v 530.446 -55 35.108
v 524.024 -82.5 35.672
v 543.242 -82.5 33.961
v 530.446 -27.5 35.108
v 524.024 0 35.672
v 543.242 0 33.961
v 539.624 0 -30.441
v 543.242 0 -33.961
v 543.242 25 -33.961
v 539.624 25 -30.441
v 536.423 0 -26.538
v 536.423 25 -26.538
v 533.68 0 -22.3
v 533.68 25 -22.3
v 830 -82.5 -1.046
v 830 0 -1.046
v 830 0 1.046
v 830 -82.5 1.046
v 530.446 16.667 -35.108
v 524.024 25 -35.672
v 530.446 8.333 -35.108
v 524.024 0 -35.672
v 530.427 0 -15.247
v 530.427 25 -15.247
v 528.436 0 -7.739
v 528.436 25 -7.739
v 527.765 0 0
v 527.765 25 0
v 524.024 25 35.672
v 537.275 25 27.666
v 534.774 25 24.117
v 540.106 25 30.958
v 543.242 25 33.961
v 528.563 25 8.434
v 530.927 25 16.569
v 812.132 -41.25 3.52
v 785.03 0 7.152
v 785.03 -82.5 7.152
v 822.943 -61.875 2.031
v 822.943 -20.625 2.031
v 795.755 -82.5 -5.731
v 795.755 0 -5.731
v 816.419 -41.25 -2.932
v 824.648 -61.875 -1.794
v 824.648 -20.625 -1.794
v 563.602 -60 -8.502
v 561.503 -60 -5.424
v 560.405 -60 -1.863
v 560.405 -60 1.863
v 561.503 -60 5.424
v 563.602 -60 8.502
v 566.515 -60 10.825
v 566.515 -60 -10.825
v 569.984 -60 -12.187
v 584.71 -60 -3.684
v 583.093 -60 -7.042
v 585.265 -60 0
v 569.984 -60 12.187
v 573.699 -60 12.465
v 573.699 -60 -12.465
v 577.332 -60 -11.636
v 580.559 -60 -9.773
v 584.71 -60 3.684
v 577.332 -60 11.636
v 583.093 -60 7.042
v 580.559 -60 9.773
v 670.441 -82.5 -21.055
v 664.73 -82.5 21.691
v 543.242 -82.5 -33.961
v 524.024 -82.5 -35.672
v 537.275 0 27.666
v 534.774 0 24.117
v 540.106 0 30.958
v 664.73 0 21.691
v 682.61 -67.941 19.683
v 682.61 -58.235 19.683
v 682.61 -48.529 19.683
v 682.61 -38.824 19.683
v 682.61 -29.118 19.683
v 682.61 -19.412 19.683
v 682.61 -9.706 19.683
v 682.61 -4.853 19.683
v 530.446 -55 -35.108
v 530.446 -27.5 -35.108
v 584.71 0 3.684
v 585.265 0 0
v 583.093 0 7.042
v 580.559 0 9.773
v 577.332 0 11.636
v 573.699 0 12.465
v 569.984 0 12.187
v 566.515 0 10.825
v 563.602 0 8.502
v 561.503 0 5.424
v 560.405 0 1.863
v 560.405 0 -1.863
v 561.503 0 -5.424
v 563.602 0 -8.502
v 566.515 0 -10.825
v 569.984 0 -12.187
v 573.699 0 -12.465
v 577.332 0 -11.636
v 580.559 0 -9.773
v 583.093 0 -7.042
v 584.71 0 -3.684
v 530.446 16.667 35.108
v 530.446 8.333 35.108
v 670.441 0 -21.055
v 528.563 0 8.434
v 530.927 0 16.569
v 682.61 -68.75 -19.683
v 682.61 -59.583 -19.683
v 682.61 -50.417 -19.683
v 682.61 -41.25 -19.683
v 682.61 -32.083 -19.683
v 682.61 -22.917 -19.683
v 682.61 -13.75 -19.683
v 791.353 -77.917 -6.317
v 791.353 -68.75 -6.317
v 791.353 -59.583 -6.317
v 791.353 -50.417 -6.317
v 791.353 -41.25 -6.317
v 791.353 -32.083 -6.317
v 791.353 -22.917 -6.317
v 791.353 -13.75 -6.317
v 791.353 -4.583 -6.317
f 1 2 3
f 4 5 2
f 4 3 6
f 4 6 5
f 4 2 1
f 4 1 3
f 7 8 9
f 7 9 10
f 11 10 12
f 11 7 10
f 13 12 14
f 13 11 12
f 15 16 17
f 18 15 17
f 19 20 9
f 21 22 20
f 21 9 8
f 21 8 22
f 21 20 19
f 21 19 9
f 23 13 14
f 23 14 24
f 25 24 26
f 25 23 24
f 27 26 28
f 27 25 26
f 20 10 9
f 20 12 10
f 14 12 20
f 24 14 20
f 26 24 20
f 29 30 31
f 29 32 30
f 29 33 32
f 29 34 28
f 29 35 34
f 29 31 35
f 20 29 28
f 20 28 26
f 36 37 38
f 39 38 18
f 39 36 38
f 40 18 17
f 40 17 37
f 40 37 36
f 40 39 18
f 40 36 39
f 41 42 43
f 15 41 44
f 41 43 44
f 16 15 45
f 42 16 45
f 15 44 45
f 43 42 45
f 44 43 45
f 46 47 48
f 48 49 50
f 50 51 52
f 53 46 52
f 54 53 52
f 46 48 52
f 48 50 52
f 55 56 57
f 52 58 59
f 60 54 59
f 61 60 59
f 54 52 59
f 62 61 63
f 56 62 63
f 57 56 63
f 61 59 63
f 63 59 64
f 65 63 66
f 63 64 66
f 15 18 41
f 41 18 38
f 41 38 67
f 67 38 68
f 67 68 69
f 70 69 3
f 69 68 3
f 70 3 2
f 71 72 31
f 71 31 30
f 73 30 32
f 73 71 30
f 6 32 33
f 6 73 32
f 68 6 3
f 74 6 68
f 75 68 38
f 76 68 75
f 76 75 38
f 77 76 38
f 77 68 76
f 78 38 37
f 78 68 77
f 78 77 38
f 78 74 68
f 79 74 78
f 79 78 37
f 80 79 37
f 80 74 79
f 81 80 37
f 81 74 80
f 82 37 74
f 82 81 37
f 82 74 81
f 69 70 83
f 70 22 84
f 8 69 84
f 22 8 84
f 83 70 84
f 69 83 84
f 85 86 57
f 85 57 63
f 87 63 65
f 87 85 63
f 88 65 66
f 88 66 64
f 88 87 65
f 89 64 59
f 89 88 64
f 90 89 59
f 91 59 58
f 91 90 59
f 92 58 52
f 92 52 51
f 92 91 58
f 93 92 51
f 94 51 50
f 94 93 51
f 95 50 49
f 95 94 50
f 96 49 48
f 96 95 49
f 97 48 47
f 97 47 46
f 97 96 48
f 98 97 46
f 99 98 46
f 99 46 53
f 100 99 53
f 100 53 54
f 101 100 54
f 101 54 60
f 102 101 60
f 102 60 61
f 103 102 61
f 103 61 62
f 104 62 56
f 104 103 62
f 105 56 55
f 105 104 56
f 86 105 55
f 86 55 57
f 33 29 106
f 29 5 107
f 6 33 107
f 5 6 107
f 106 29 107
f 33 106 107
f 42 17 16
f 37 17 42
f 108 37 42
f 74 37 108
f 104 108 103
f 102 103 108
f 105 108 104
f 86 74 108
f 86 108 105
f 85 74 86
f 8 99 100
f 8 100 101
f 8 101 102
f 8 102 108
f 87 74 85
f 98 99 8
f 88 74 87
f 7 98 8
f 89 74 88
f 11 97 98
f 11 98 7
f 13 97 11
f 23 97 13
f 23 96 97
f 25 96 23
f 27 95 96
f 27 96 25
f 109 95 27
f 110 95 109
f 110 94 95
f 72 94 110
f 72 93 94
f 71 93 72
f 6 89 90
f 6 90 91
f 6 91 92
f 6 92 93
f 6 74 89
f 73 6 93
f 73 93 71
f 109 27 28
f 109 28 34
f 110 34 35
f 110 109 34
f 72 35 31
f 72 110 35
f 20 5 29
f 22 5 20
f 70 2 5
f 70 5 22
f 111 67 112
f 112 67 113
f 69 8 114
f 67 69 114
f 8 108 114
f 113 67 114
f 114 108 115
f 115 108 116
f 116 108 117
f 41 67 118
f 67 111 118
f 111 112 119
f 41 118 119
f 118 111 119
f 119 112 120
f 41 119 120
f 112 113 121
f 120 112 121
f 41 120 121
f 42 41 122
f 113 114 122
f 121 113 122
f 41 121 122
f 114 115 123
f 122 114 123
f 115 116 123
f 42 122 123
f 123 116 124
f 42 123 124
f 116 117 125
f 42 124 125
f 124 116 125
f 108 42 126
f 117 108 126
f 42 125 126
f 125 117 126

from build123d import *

# Parameters (mm, degrees)
F1_DEPTH = 82.5
F2_DEPTH = 25
F3_R     = 12.5
F4_DEPTH = 60


with BuildPart() as f1:
    # F0 (on Front) → F1 (new body)
    with BuildSketch(Plane.XZ):
        with BuildLine():
            add(Edge.make_bspline(
                [(524.024, 35.6715651167), (530.4529675183, 35.1109062879), (536.8603422789, 34.540475321), (543.2421, 33.9614)],
                knots=[0.6159550767, 0.6159550767, 0.6159550767, 0.6159550767, 0.635369827, 0.635369827, 0.635369827, 0.635369827], degree=3))
            Line((524.024, 35.6715651167), (524.024, 25.1107127602))
            add(Edge.make_bspline(
                [(524.024, 25.1107127602), (526.6770638269, 24.868020166), (530.2603237936, 24.5375720807), (533.8432643328, 24.2037227591), (534.7735361573, 24.1168150682)],
                knots=[513.3651484855, 513.3651484855, 513.3651484855, 513.3651484855, 521.3575419642, 524.1605032173, 524.1605032173, 524.1605032173, 524.1605032173], degree=3))
            ThreePointArc((534.7735361573, 24.1168150682), (538.650838246, 29.3461907199), (543.2421, 33.9614))
        make_face()
        with BuildLine():
            Line((524.024, -23.2286070743), (524.024, -35.6715651167))
            add(Edge.make_bspline(
                [(524.024, -35.6715651167), (530.4529675183, -35.1109062879), (536.8603422789, -34.540475321), (543.2421, -33.9614)],
                knots=[0.6159550767, 0.6159550767, 0.6159550767, 0.6159550767, 0.635369827, 0.635369827, 0.635369827, 0.635369827], degree=3))
            ThreePointArc((543.2421, -33.9614), (537.9689313182, -28.5343309954), (533.6796750092, -22.3004184004))
            add(Edge.make_bspline(
                [(524.024, -23.2286070743), (526.7063477836, -22.9731340758), (529.9249490386, -22.6641634275), (533.1432820941, -22.3524476401), (533.6796750092, -22.3004184004)],
                knots=[513.2741132252, 513.2741132252, 513.2741132252, 513.2741132252, 521.3575419641, 522.9742691651, 522.9742691651, 522.9742691651, 522.9742691651], degree=3))
        make_face()
        with BuildLine():
            add(Edge.make_bspline(
                [(524.024, 25.1107127602), (526.6770638269, 24.868020166), (530.2603237936, 24.5375720807), (533.8432643328, 24.2037227591), (534.7735361573, 24.1168150682)],
                knots=[513.3651484855, 513.3651484855, 513.3651484855, 513.3651484855, 521.3575419642, 524.1605032173, 524.1605032173, 524.1605032173, 524.1605032173], degree=3))
            Line((524.024, 25.1107127602), (524.024, 0))
            Line((524.024, 0), (527.7653672657, 0))
            ThreePointArc((527.7653672657, 0), (529.5529130431, 12.5572210326), (534.7735361573, 24.1168150682))
        make_face()
        with BuildLine():
            Line((524.024, 0), (524.024, -23.2286070743))
            add(Edge.make_bspline(
                [(524.024, -23.2286070743), (526.7063477836, -22.9731340758), (529.9249490386, -22.6641634275), (533.1432820941, -22.3524476401), (533.6796750092, -22.3004184004)],
                knots=[513.2741132252, 513.2741132252, 513.2741132252, 513.2741132252, 521.3575419641, 522.9742691651, 522.9742691651, 522.9742691651, 522.9742691651], degree=3))
            ThreePointArc((533.6796750092, -22.3004184004), (529.2690677016, -11.535680484), (527.7653672657, 0))
            Line((527.7653672657, 0), (524.024, 0))
        make_face()
        with BuildLine():
            add(Edge.make_bspline(
                [(543.2421, 33.9614), (549.5750436875, 33.3867540232), (562.1338476881, 32.225672374), (580.7053749717, 30.4486309004), (598.8899905971, 28.6520916952), (616.645063933, 26.8456524154), (633.9293517992, 25.0378311486), (650.7021084927, 23.2377895738), (666.924523511, 21.4542053534), (682.5583919944, 19.6948931431), (697.5675188661, 17.9689901739), (711.9166403588, 16.2843520174), (725.5723159977, 14.6495448382), (738.5025922877, 13.0722198932), (750.6773575973, 11.5611505206), (762.0679980169, 10.123355488), (772.6482697775, 8.767506964), (780.1684058461, 7.7893010713), (784.1801262556, 7.2631536294), (785.0296548206, 7.1515377434)],
                knots=[0.635369827, 0.635369827, 0.635369827, 0.635369827, 0.654636074, 0.6737293504, 0.6926255053, 0.7112999065, 0.7297277282, 0.747883428, 0.7657412837, 0.7832747177, 0.8004566202, 0.8172588362, 0.8336522425, 0.8496064603, 0.8650895564, 0.8800677295, 0.8945049966, 0.9083621399, 0.9121165786, 0.9121165786, 0.9121165786, 0.9121165786], degree=3))
            ThreePointArc((543.2421, 33.9614), (538.650838246, 29.3461907199), (534.7735361573, 24.1168150682))
            add(Edge.make_bspline(
                [(534.7735361573, 24.1168150682), (547.4888491387, 22.9289273345), (570.2810474133, 20.7234876988), (602.9514797769, 17.4132456465), (629.5721727855, 14.5753690345), (646.1150179567, 12.7470797563), (652.7777391491, 12)],
                knots=[524.1605032173, 524.1605032173, 524.1605032173, 524.1605032173, 562.4724553443, 592.8561025481, 622.6732889332, 642.7866986571, 642.7866986571, 642.7866986571, 642.7866986571], degree=3))
            Line((652.7777391491, 12), (665.973, 12))
            ThreePointArc((665.973, 12), (669.6925428199, 11.4089877382), (673.0457030707, 9.6941668684))
            add(Edge.make_bspline(
                [(673.0457030707, 9.6941668684), (678.6430527256, 9.0482316549), (693.2761814168, 7.3399638663), (715.1021603081, 4.7178028299), (732.4511827497, 2.5525104658), (740.7700852943, 1.4970109313), (741.8962423005, 1.3538186415)],
                knots=[663.1854009899, 663.1854009899, 663.1854009899, 663.1854009899, 680.0888797975, 707.3828314911, 729.1339381861, 732.5396092821, 732.5396092821, 732.5396092821, 732.5396092821], degree=3))
            add(Edge.make_bspline(
                [(741.8962423005, 1.3538186415), (746.2843670673, 1.9285048035), (754.6747553371, 3.0362373869), (766.9194584147, 4.6744667559), (776.9091256945, 6.0324501077), (782.8966080674, 6.8566568424), (785.0296548206, 7.1515377434)],
                knots=[732.5396092819, 732.5396092819, 732.5396092819, 732.5396092819, 745.8163943039, 757.9291810967, 769.6010098164, 776.0610078587, 776.0610078587, 776.0610078587, 776.0610078587], degree=3))
        make_face()
        with BuildLine():
            ThreePointArc((533.6796750092, -22.3004184004), (537.9689313182, -28.5343309954), (543.2421, -33.9614))
            add(Edge.make_bspline(
                [(543.2421, -33.9614), (549.5750436875, -33.3867540232), (562.1338476881, -32.225672374), (580.7053749717, -30.4486309004), (598.8899905971, -28.6520916952), (616.645063933, -26.8456524154), (633.9293517992, -25.0378311486), (650.7021084927, -23.2377895738), (666.924523511, -21.4542053534), (682.5583919944, -19.6948931431), (697.5675188661, -17.9689901739), (711.9166403588, -16.2843520174), (725.5723159977, -14.6495448382), (738.5025922877, -13.0722198932), (750.6773575973, -11.5611505206), (762.0679980169, -10.123355488), (772.6482697775, -8.767506964), (782.3928967751, -7.4999432572), (789.9922436278, -6.4986676858), (794.3093421293, -5.9243671687), (795.7553403022, -5.731408495)],
                knots=[0.635369827, 0.635369827, 0.635369827, 0.635369827, 0.654636074, 0.6737293504, 0.6926255053, 0.7112999065, 0.7297277282, 0.747883428, 0.7657412837, 0.7832747177, 0.8004566202, 0.8172588362, 0.8336522425, 0.8496064603, 0.8650895564, 0.8800677295, 0.8945049966, 0.9083621399, 0.921596776, 0.9284158886, 0.9284158886, 0.9284158886, 0.9284158886], degree=3))
            add(Edge.make_bspline(
                [(752.4752127939, 0), (753.3385987131, -0.1111737387), (758.2064040588, -0.7388852768), (766.9317355754, -1.8729638235), (778.4845581837, -3.3993366737), (788.0433504555, -4.682906586), (793.7449819172, -5.4572465403), (795.7553403022, -5.731408495)],
                knots=[743.2048524915, 743.2048524915, 743.2048524915, 743.2048524915, 745.816394304, 757.9291810969, 769.6010098166, 780.7760242539, 786.8629233002, 786.8629233002, 786.8629233002, 786.8629233002], degree=3))
            Line((752.4752127939, 0), (731.4902537549, 0))
            add(Edge.make_bspline(
                [(675.7749550869, -6.922548409), (680.4704196169, -6.3608211123), (694.1976504575, -4.7032327955), (712.7702276209, -2.4012449385), (726.6428498764, -0.6263462539), (731.4902537549, 0)],
                knots=[665.902054437, 665.902054437, 665.902054437, 665.902054437, 680.0888797974, 707.382831491, 722.0459285975, 722.0459285975, 722.0459285975, 722.0459285975], degree=3))
            ThreePointArc((675.7749550869, -6.922548409), (671.4924845363, -10.6552940107), (665.973, -12))
            Line((665.973, -12), (632.0462382215, -12))
            add(Edge.make_bspline(
                [(579.5327593007, -17.6845550908), (587.4225464727, -16.8640224682), (604.9318542045, -15.0134548613), (622.4325289508, -13.08262656), (632.0462382215, -12)],
                knots=[569.0591158558, 569.0591158558, 569.0591158558, 569.0591158558, 592.856102548, 621.8794937898, 621.8794937898, 621.8794937898, 621.8794937898], degree=3))
            add(Edge.make_bspline(
                [(569.024, -20), (574.601223494, -20), (579.5327593007, -17.6845550908)],
                knots=[4.7123889804, 4.7123889804, 4.7123889804, 5.1983473252, 5.1983473252, 5.1983473252], degree=2, weights=[1, 0.9706255083, 1]))
            add(Edge.make_bspline(
                [(563.3375761456, -19.3507371729), (566.1338768344, -20), (569.024, -20)],
                knots=[4.4568882152, 4.4568882152, 4.4568882152, 4.7123889804, 4.7123889804, 4.7123889804], degree=2, weights=[1, 0.9918510117, 1]))
            add(Edge.make_bspline(
                [(533.6796750092, -22.3004184004), (543.5680241797, -21.3412646258), (553.4538623678, -20.3564530629), (563.3375761456, -19.3507371729)],
                knots=[522.9742691651, 522.9742691651, 522.9742691651, 522.9742691651, 552.7784716909, 552.7784716909, 552.7784716909, 552.7784716909], degree=3))
        make_face()
        with BuildLine():
            add(Edge.make_bspline(
                [(534.7735361573, 24.1168150682), (547.4888491387, 22.9289273345), (570.2810474133, 20.7234876988), (602.9514797769, 17.4132456465), (629.5721727855, 14.5753690345), (646.1150179567, 12.7470797563), (652.7777391491, 12)],
                knots=[524.1605032173, 524.1605032173, 524.1605032173, 524.1605032173, 562.4724553443, 592.8561025481, 622.6732889332, 642.7866986571, 642.7866986571, 642.7866986571, 642.7866986571], degree=3))
            ThreePointArc((534.7735361573, 24.1168150682), (529.5529130431, 12.5572210326), (527.7653672657, 0))
            Line((527.7653672657, 0), (546.524, 0))
            add(Edge.make_bspline(
                [(591.524, 0), (591.524, 20), (569.024, 20), (546.524, 20), (546.524, 0)],
                knots=[0, 0, 0, 1.5707963268, 1.5707963268, 3.1415926536, 3.1415926536, 3.1415926536], degree=2, weights=[1, 0.7071067812, 1, 0.7071067812, 1]))
            Line((591.524, 0), (623.973, 0))
            Line((623.973, 0), (623.973, 10))
            ThreePointArc((623.973, 10), (624.5587864376, 11.4142135624), (625.973, 12))
            Line((625.973, 12), (652.7777391491, 12))
        make_face()
        with BuildLine():
            ThreePointArc((527.7653672657, 0), (529.2690677016, -11.535680484), (533.6796750092, -22.3004184004))
            add(Edge.make_bspline(
                [(533.6796750092, -22.3004184004), (543.5680241797, -21.3412646258), (553.4538623678, -20.3564530629), (563.3375761456, -19.3507371729)],
                knots=[522.9742691651, 522.9742691651, 522.9742691651, 522.9742691651, 552.7784716909, 552.7784716909, 552.7784716909, 552.7784716909], degree=3))
            add(Edge.make_bspline(
                [(546.524, 0), (546.524, -15.4468544374), (563.3375761456, -19.3507371729)],
                knots=[3.1415926536, 3.1415926536, 3.1415926536, 4.4568882152, 4.4568882152, 4.4568882152], degree=2, weights=[1, 0.7914322299, 1]))
            Line((546.524, 0), (527.7653672657, 0))
        make_face()
        with BuildLine():
            add(Edge.make_bspline(
                [(785.0296548206, 7.1515377434), (787.174768668, 6.8697005072), (792.0785180819, 6.2224623401), (799.2875794028, 5.2606805783), (806.398007937, 4.3017234095), (812.5937368846, 3.4579115596), (817.8623783077, 2.7342517017), (822.1845332462, 2.1365671069), (825.5717903187, 1.6654782983), (827.9484571682, 1.33323589), (829.4727060537, 1.1198422864), (829.8586880275, 1.0656429389), (830, 1.0458)],
                knots=[0.9121165786, 0.9121165786, 0.9121165786, 0.9121165786, 0.921596776, 0.9341612481, 0.9460018444, 0.9570561288, 0.9672492741, 0.9764880356, 0.9846490394, 0.9915545746, 0.9969080429, 1, 1, 1, 1], degree=3))
            add(Edge.make_bspline(
                [(741.8962423005, 1.3538186415), (746.2843670673, 1.9285048035), (754.6747553371, 3.0362373869), (766.9194584147, 4.6744667559), (776.9091256945, 6.0324501077), (782.8966080674, 6.8566568424), (785.0296548206, 7.1515377434)],
                knots=[732.5396092819, 732.5396092819, 732.5396092819, 732.5396092819, 745.8163943039, 757.9291810967, 769.6010098164, 776.0610078587, 776.0610078587, 776.0610078587, 776.0610078587], degree=3))
            add(Edge.make_bspline(
                [(741.8962423005, 1.3538186415), (745.4229300003, 0.9053958333), (748.9492417496, 0.4540210524), (752.4752127939, 0)],
                knots=[732.5396092821, 732.5396092821, 732.5396092821, 732.5396092821, 743.2048524915, 743.2048524915, 743.2048524915, 743.2048524915], degree=3))
            Line((752.4752127939, 0), (830, 0))
            Line((830, 0), (830, 1.0458))
        make_face()
        with BuildLine():
            add(Edge.make_bspline(
                [(752.4752127939, 0), (753.3385987131, -0.1111737387), (758.2064040588, -0.7388852768), (766.9317355754, -1.8729638235), (778.4845581837, -3.3993366737), (788.0433504555, -4.682906586), (793.7449819172, -5.4572465403), (795.7553403022, -5.731408495)],
                knots=[743.2048524915, 743.2048524915, 743.2048524915, 743.2048524915, 745.816394304, 757.9291810969, 769.6010098166, 780.7760242539, 786.8629233002, 786.8629233002, 786.8629233002, 786.8629233002], degree=3))
            add(Edge.make_bspline(
                [(795.7553403022, -5.731408495), (796.9736482838, -5.568833537), (800.6549707765, -5.0762655667), (806.398007937, -4.3017234095), (812.5937368846, -3.4579115596), (817.8623783077, -2.7342517017), (822.1845332462, -2.1365671069), (825.5717903187, -1.6654782983), (827.9484571682, -1.33323589), (829.4727060537, -1.1198422864), (829.8586880275, -1.0656429389), (830, -1.0458)],
                knots=[0.9284158886, 0.9284158886, 0.9284158886, 0.9284158886, 0.9341612481, 0.9460018444, 0.9570561288, 0.9672492741, 0.9764880356, 0.9846490394, 0.9915545746, 0.9969080429, 1, 1, 1, 1], degree=3))
            Line((830, -1.0458), (830, 0))
            Line((830, 0), (752.4752127939, 0))
        make_face()
        with BuildLine():
            Line((665.973, 12), (652.7777391491, 12))
            add(Edge.make_bspline(
                [(652.7777391491, 12), (655.762922623, 11.6652763822), (660.161514663, 11.1688961032), (664.5595773708, 10.6678568096), (665.973, 10.5063520034)],
                knots=[642.7866986571, 642.7866986571, 642.7866986571, 642.7866986571, 651.7983646979, 656.0662217526, 656.0662217526, 656.0662217526, 656.0662217526], degree=3))
            Line((665.973, 10.5063520034), (665.973, 12))
        make_face()
        with BuildLine():
            add(Edge.make_bspline(
                [(652.7777391491, 12), (655.762922623, 11.6652763822), (660.161514663, 11.1688961032), (664.5595773708, 10.6678568096), (665.973, 10.5063520034)],
                knots=[642.7866986571, 642.7866986571, 642.7866986571, 642.7866986571, 651.7983646979, 656.0662217526, 656.0662217526, 656.0662217526, 656.0662217526], degree=3))
            Line((652.7777391491, 12), (625.973, 12))
            ThreePointArc((625.973, 12), (624.5587864376, 11.4142135624), (623.973, 10))
            Line((623.973, 10), (623.973, 0))
            Line((623.973, 0), (665.973, 0))
            Line((665.973, 0), (665.973, 10.5063520034))
        make_face()
        with BuildLine():
            add(Edge.make_bspline(
                [(546.524, 0), (546.524, -15.4468544374), (563.3375761456, -19.3507371729)],
                knots=[3.1415926536, 3.1415926536, 3.1415926536, 4.4568882152, 4.4568882152, 4.4568882152], degree=2, weights=[1, 0.7914322299, 1]))
            add(Edge.make_bspline(
                [(563.3375761456, -19.3507371729), (566.5523093603, -19.0236224518), (571.9509432397, -18.4705327095), (577.3489807289, -17.911666611), (579.5327593007, -17.6845550908)],
                knots=[552.7784716909, 552.7784716909, 552.7784716909, 552.7784716909, 562.4724553442, 569.0591158558, 569.0591158558, 569.0591158558, 569.0591158558], degree=3))
            add(Edge.make_bspline(
                [(579.5327593007, -17.6845550908), (591.524, -12.0544515447), (591.524, 0)],
                knots=[5.1983473252, 5.1983473252, 5.1983473252, 6.2831853072, 6.2831853072, 6.2831853072], degree=2, weights=[1, 0.8564624828, 1]))
            Line((591.524, 0), (546.524, 0))
        make_face()
        with BuildLine():
            add(Edge.make_bspline(
                [(563.3375761456, -19.3507371729), (566.5523093603, -19.0236224518), (571.9509432397, -18.4705327095), (577.3489807289, -17.911666611), (579.5327593007, -17.6845550908)],
                knots=[552.7784716909, 552.7784716909, 552.7784716909, 552.7784716909, 562.4724553442, 569.0591158558, 569.0591158558, 569.0591158558, 569.0591158558], degree=3))
            add(Edge.make_bspline(
                [(563.3375761456, -19.3507371729), (566.1338768344, -20), (569.024, -20)],
                knots=[4.4568882152, 4.4568882152, 4.4568882152, 4.7123889804, 4.7123889804, 4.7123889804], degree=2, weights=[1, 0.9918510117, 1]))
            add(Edge.make_bspline(
                [(569.024, -20), (574.601223494, -20), (579.5327593007, -17.6845550908)],
                knots=[4.7123889804, 4.7123889804, 4.7123889804, 5.1983473252, 5.1983473252, 5.1983473252], degree=2, weights=[1, 0.9706255083, 1]))
        make_face()
        with BuildLine():
            add(Edge.make_bspline(
                [(731.4902537549, 0), (733.8334453003, 0.3027701597), (737.3022307159, 0.7531116765), (740.7706302145, 1.2064040341), (741.8962423005, 1.3538186415)],
                knots=[722.0459285975, 722.0459285975, 722.0459285975, 722.0459285975, 729.1339381859, 732.5396092819, 732.5396092819, 732.5396092819, 732.5396092819], degree=3))
            add(Edge.make_bspline(
                [(673.0457030707, 9.6941668684), (678.6430527256, 9.0482316549), (693.2761814168, 7.3399638663), (715.1021603081, 4.7178028299), (732.4511827497, 2.5525104658), (740.7700852943, 1.4970109313), (741.8962423005, 1.3538186415)],
                knots=[663.1854009899, 663.1854009899, 663.1854009899, 663.1854009899, 680.0888797975, 707.3828314911, 729.1339381861, 732.5396092821, 732.5396092821, 732.5396092821, 732.5396092821], degree=3))
            ThreePointArc((673.0457030707, 9.6941668684), (676.6704865471, 5.4372586453), (677.973, 0))
            Line((677.973, 0), (731.4902537549, 0))
        make_face()
        with BuildLine():
            add(Edge.make_bspline(
                [(741.8962423005, 1.3538186415), (745.4229300003, 0.9053958333), (748.9492417496, 0.4540210524), (752.4752127939, 0)],
                knots=[732.5396092821, 732.5396092821, 732.5396092821, 732.5396092821, 743.2048524915, 743.2048524915, 743.2048524915, 743.2048524915], degree=3))
            add(Edge.make_bspline(
                [(731.4902537549, 0), (733.8334453003, 0.3027701597), (737.3022307159, 0.7531116765), (740.7706302145, 1.2064040341), (741.8962423005, 1.3538186415)],
                knots=[722.0459285975, 722.0459285975, 722.0459285975, 722.0459285975, 729.1339381859, 732.5396092819, 732.5396092819, 732.5396092819, 732.5396092819], degree=3))
            Line((731.4902537549, 0), (752.4752127939, 0))
        make_face()
        with BuildLine():
            add(Edge.make_bspline(
                [(591.524, 0), (591.524, 20), (569.024, 20), (546.524, 20), (546.524, 0)],
                knots=[0, 0, 0, 1.5707963268, 1.5707963268, 3.1415926536, 3.1415926536, 3.1415926536], degree=2, weights=[1, 0.7071067812, 1, 0.7071067812, 1]))
            Line((546.524, 0), (591.524, 0))
        make_face()
        with BuildLine():
            Line((665.973, 12), (665.973, 10.5063520034))
            add(Edge.make_bspline(
                [(665.973, 10.5063520034), (668.3307193205, 10.2369470894), (670.6882868311, 9.9662131504), (673.0457030707, 9.6941668684)],
                knots=[656.0662217526, 656.0662217526, 656.0662217526, 656.0662217526, 663.1854009899, 663.1854009899, 663.1854009899, 663.1854009899], degree=3))
            ThreePointArc((673.0457030707, 9.6941668684), (669.6925428199, 11.4089877382), (665.973, 12))
        make_face()
        with BuildLine():
            add(Edge.make_bspline(
                [(665.973, 10.5063520034), (668.3307193205, 10.2369470894), (670.6882868311, 9.9662131504), (673.0457030707, 9.6941668684)],
                knots=[656.0662217526, 656.0662217526, 656.0662217526, 656.0662217526, 663.1854009899, 663.1854009899, 663.1854009899, 663.1854009899], degree=3))
            Line((665.973, 10.5063520034), (665.973, 0))
            Line((665.973, 0), (677.973, 0))
            ThreePointArc((677.973, 0), (676.6704865471, 5.4372586453), (673.0457030707, 9.6941668684))
        make_face()
        with BuildLine():
            add(Edge.make_bspline(
                [(579.5327593007, -17.6845550908), (591.524, -12.0544515447), (591.524, 0)],
                knots=[5.1983473252, 5.1983473252, 5.1983473252, 6.2831853072, 6.2831853072, 6.2831853072], degree=2, weights=[1, 0.8564624828, 1]))
            add(Edge.make_bspline(
                [(579.5327593007, -17.6845550908), (587.4225464727, -16.8640224682), (604.9318542045, -15.0134548613), (622.4325289508, -13.08262656), (632.0462382215, -12)],
                knots=[569.0591158558, 569.0591158558, 569.0591158558, 569.0591158558, 592.856102548, 621.8794937898, 621.8794937898, 621.8794937898, 621.8794937898], degree=3))
            Line((632.0462382215, -12), (625.973, -12))
            ThreePointArc((625.973, -12), (624.5587864376, -11.4142135624), (623.973, -10))
            Line((623.973, -10), (623.973, 0))
            Line((623.973, 0), (591.524, 0))
        make_face()
        with BuildLine():
            add(Edge.make_bspline(
                [(675.7749550869, -6.922548409), (680.4704196169, -6.3608211123), (694.1976504575, -4.7032327955), (712.7702276209, -2.4012449385), (726.6428498764, -0.6263462539), (731.4902537549, 0)],
                knots=[665.902054437, 665.902054437, 665.902054437, 665.902054437, 680.0888797974, 707.382831491, 722.0459285975, 722.0459285975, 722.0459285975, 722.0459285975], degree=3))
            Line((731.4902537549, 0), (677.973, 0))
            ThreePointArc((677.973, 0), (677.4102955947, -3.6315657062), (675.7749550869, -6.922548409))
        make_face()
        with BuildLine():
            Line((665.973, -8.0874938306), (665.973, 0))
            Line((665.973, 0), (623.973, 0))
            Line((623.973, 0), (623.973, -10))
            ThreePointArc((623.973, -10), (624.5587864376, -11.4142135624), (625.973, -12))
            Line((625.973, -12), (632.0462382215, -12))
            add(Edge.make_bspline(
                [(632.0462382215, -12), (632.3091749564, -11.9703899624), (642.2194339984, -10.8537488755), (653.528780869, -9.5529086768), (664.5718113348, -8.2529185042), (665.973, -8.0874938306)],
                knots=[621.8794937898, 621.8794937898, 621.8794937898, 621.8794937898, 622.6732889331, 651.7983646977, 656.0311218622, 656.0311218622, 656.0311218622, 656.0311218622], degree=3))
        make_face()
        with BuildLine():
            Line((677.973, 0), (665.973, 0))
            Line((665.973, 0), (665.973, -8.0874938306))
            add(Edge.make_bspline(
                [(665.973, -8.0874938306), (669.2406192612, -7.7017179081), (672.5079370891, -7.3133879471), (675.7749550869, -6.922548409)],
                knots=[656.0311218622, 656.0311218622, 656.0311218622, 656.0311218622, 665.902054437, 665.902054437, 665.902054437, 665.902054437], degree=3))
            ThreePointArc((675.7749550869, -6.922548409), (677.4102955947, -3.6315657062), (677.973, 0))
        make_face()
        with BuildLine():
            add(Edge.make_bspline(
                [(632.0462382215, -12), (632.3091749564, -11.9703899624), (642.2194339984, -10.8537488755), (653.528780869, -9.5529086768), (664.5718113348, -8.2529185042), (665.973, -8.0874938306)],
                knots=[621.8794937898, 621.8794937898, 621.8794937898, 621.8794937898, 622.6732889331, 651.7983646977, 656.0311218622, 656.0311218622, 656.0311218622, 656.0311218622], degree=3))
            Line((632.0462382215, -12), (665.973, -12))
            Line((665.973, -12), (665.973, -8.0874938306))
        make_face()
        with BuildLine():
            ThreePointArc((665.973, -12), (671.4924845363, -10.6552940107), (675.7749550869, -6.922548409))
            add(Edge.make_bspline(
                [(665.973, -8.0874938306), (669.2406192612, -7.7017179081), (672.5079370891, -7.3133879471), (675.7749550869, -6.922548409)],
                knots=[656.0311218622, 656.0311218622, 656.0311218622, 656.0311218622, 665.902054437, 665.902054437, 665.902054437, 665.902054437], degree=3))
            Line((665.973, -8.0874938306), (665.973, -12))
        make_face()
    extrude(amount=F1_DEPTH)

    # F0 (on Front) → F2 (join)
    with BuildSketch(Plane.XZ):
        with BuildLine():
            add(Edge.make_bspline(
                [(524.024, 35.6715651167), (530.4529675183, 35.1109062879), (536.8603422789, 34.540475321), (543.2421, 33.9614)],
                knots=[0.6159550767, 0.6159550767, 0.6159550767, 0.6159550767, 0.635369827, 0.635369827, 0.635369827, 0.635369827], degree=3))
            Line((524.024, 35.6715651167), (524.024, 25.1107127602))
            add(Edge.make_bspline(
                [(524.024, 25.1107127602), (526.6770638269, 24.868020166), (530.2603237936, 24.5375720807), (533.8432643328, 24.2037227591), (534.7735361573, 24.1168150682)],
                knots=[513.3651484855, 513.3651484855, 513.3651484855, 513.3651484855, 521.3575419642, 524.1605032173, 524.1605032173, 524.1605032173, 524.1605032173], degree=3))
            ThreePointArc((534.7735361573, 24.1168150682), (538.650838246, 29.3461907199), (543.2421, 33.9614))
        make_face()
        with BuildLine():
            Line((524.024, -23.2286070743), (524.024, -35.6715651167))
            add(Edge.make_bspline(
                [(524.024, -35.6715651167), (530.4529675183, -35.1109062879), (536.8603422789, -34.540475321), (543.2421, -33.9614)],
                knots=[0.6159550767, 0.6159550767, 0.6159550767, 0.6159550767, 0.635369827, 0.635369827, 0.635369827, 0.635369827], degree=3))
            ThreePointArc((543.2421, -33.9614), (537.9689313182, -28.5343309954), (533.6796750092, -22.3004184004))
            add(Edge.make_bspline(
                [(524.024, -23.2286070743), (526.7063477836, -22.9731340758), (529.9249490386, -22.6641634275), (533.1432820941, -22.3524476401), (533.6796750092, -22.3004184004)],
                knots=[513.2741132252, 513.2741132252, 513.2741132252, 513.2741132252, 521.3575419641, 522.9742691651, 522.9742691651, 522.9742691651, 522.9742691651], degree=3))
        make_face()
        with BuildLine():
            add(Edge.make_bspline(
                [(524.024, 25.1107127602), (526.6770638269, 24.868020166), (530.2603237936, 24.5375720807), (533.8432643328, 24.2037227591), (534.7735361573, 24.1168150682)],
                knots=[513.3651484855, 513.3651484855, 513.3651484855, 513.3651484855, 521.3575419642, 524.1605032173, 524.1605032173, 524.1605032173, 524.1605032173], degree=3))
            Line((524.024, 25.1107127602), (524.024, 0))
            Line((524.024, 0), (527.7653672657, 0))
            ThreePointArc((527.7653672657, 0), (529.5529130431, 12.5572210326), (534.7735361573, 24.1168150682))
        make_face()
        with BuildLine():
            Line((524.024, 0), (524.024, -23.2286070743))
            add(Edge.make_bspline(
                [(524.024, -23.2286070743), (526.7063477836, -22.9731340758), (529.9249490386, -22.6641634275), (533.1432820941, -22.3524476401), (533.6796750092, -22.3004184004)],
                knots=[513.2741132252, 513.2741132252, 513.2741132252, 513.2741132252, 521.3575419641, 522.9742691651, 522.9742691651, 522.9742691651, 522.9742691651], degree=3))
            ThreePointArc((533.6796750092, -22.3004184004), (529.2690677016, -11.535680484), (527.7653672657, 0))
            Line((527.7653672657, 0), (524.024, 0))
        make_face()
    extrude(amount=-F2_DEPTH)

    # F3 (on face) → F4 (cut)
    with BuildSketch(Plane.XZ):
        with Locations((572.7653672657, 0)):
            Circle(F3_R)
    extrude(amount=F4_DEPTH, mode=Mode.SUBTRACT)


solid = f1.part
